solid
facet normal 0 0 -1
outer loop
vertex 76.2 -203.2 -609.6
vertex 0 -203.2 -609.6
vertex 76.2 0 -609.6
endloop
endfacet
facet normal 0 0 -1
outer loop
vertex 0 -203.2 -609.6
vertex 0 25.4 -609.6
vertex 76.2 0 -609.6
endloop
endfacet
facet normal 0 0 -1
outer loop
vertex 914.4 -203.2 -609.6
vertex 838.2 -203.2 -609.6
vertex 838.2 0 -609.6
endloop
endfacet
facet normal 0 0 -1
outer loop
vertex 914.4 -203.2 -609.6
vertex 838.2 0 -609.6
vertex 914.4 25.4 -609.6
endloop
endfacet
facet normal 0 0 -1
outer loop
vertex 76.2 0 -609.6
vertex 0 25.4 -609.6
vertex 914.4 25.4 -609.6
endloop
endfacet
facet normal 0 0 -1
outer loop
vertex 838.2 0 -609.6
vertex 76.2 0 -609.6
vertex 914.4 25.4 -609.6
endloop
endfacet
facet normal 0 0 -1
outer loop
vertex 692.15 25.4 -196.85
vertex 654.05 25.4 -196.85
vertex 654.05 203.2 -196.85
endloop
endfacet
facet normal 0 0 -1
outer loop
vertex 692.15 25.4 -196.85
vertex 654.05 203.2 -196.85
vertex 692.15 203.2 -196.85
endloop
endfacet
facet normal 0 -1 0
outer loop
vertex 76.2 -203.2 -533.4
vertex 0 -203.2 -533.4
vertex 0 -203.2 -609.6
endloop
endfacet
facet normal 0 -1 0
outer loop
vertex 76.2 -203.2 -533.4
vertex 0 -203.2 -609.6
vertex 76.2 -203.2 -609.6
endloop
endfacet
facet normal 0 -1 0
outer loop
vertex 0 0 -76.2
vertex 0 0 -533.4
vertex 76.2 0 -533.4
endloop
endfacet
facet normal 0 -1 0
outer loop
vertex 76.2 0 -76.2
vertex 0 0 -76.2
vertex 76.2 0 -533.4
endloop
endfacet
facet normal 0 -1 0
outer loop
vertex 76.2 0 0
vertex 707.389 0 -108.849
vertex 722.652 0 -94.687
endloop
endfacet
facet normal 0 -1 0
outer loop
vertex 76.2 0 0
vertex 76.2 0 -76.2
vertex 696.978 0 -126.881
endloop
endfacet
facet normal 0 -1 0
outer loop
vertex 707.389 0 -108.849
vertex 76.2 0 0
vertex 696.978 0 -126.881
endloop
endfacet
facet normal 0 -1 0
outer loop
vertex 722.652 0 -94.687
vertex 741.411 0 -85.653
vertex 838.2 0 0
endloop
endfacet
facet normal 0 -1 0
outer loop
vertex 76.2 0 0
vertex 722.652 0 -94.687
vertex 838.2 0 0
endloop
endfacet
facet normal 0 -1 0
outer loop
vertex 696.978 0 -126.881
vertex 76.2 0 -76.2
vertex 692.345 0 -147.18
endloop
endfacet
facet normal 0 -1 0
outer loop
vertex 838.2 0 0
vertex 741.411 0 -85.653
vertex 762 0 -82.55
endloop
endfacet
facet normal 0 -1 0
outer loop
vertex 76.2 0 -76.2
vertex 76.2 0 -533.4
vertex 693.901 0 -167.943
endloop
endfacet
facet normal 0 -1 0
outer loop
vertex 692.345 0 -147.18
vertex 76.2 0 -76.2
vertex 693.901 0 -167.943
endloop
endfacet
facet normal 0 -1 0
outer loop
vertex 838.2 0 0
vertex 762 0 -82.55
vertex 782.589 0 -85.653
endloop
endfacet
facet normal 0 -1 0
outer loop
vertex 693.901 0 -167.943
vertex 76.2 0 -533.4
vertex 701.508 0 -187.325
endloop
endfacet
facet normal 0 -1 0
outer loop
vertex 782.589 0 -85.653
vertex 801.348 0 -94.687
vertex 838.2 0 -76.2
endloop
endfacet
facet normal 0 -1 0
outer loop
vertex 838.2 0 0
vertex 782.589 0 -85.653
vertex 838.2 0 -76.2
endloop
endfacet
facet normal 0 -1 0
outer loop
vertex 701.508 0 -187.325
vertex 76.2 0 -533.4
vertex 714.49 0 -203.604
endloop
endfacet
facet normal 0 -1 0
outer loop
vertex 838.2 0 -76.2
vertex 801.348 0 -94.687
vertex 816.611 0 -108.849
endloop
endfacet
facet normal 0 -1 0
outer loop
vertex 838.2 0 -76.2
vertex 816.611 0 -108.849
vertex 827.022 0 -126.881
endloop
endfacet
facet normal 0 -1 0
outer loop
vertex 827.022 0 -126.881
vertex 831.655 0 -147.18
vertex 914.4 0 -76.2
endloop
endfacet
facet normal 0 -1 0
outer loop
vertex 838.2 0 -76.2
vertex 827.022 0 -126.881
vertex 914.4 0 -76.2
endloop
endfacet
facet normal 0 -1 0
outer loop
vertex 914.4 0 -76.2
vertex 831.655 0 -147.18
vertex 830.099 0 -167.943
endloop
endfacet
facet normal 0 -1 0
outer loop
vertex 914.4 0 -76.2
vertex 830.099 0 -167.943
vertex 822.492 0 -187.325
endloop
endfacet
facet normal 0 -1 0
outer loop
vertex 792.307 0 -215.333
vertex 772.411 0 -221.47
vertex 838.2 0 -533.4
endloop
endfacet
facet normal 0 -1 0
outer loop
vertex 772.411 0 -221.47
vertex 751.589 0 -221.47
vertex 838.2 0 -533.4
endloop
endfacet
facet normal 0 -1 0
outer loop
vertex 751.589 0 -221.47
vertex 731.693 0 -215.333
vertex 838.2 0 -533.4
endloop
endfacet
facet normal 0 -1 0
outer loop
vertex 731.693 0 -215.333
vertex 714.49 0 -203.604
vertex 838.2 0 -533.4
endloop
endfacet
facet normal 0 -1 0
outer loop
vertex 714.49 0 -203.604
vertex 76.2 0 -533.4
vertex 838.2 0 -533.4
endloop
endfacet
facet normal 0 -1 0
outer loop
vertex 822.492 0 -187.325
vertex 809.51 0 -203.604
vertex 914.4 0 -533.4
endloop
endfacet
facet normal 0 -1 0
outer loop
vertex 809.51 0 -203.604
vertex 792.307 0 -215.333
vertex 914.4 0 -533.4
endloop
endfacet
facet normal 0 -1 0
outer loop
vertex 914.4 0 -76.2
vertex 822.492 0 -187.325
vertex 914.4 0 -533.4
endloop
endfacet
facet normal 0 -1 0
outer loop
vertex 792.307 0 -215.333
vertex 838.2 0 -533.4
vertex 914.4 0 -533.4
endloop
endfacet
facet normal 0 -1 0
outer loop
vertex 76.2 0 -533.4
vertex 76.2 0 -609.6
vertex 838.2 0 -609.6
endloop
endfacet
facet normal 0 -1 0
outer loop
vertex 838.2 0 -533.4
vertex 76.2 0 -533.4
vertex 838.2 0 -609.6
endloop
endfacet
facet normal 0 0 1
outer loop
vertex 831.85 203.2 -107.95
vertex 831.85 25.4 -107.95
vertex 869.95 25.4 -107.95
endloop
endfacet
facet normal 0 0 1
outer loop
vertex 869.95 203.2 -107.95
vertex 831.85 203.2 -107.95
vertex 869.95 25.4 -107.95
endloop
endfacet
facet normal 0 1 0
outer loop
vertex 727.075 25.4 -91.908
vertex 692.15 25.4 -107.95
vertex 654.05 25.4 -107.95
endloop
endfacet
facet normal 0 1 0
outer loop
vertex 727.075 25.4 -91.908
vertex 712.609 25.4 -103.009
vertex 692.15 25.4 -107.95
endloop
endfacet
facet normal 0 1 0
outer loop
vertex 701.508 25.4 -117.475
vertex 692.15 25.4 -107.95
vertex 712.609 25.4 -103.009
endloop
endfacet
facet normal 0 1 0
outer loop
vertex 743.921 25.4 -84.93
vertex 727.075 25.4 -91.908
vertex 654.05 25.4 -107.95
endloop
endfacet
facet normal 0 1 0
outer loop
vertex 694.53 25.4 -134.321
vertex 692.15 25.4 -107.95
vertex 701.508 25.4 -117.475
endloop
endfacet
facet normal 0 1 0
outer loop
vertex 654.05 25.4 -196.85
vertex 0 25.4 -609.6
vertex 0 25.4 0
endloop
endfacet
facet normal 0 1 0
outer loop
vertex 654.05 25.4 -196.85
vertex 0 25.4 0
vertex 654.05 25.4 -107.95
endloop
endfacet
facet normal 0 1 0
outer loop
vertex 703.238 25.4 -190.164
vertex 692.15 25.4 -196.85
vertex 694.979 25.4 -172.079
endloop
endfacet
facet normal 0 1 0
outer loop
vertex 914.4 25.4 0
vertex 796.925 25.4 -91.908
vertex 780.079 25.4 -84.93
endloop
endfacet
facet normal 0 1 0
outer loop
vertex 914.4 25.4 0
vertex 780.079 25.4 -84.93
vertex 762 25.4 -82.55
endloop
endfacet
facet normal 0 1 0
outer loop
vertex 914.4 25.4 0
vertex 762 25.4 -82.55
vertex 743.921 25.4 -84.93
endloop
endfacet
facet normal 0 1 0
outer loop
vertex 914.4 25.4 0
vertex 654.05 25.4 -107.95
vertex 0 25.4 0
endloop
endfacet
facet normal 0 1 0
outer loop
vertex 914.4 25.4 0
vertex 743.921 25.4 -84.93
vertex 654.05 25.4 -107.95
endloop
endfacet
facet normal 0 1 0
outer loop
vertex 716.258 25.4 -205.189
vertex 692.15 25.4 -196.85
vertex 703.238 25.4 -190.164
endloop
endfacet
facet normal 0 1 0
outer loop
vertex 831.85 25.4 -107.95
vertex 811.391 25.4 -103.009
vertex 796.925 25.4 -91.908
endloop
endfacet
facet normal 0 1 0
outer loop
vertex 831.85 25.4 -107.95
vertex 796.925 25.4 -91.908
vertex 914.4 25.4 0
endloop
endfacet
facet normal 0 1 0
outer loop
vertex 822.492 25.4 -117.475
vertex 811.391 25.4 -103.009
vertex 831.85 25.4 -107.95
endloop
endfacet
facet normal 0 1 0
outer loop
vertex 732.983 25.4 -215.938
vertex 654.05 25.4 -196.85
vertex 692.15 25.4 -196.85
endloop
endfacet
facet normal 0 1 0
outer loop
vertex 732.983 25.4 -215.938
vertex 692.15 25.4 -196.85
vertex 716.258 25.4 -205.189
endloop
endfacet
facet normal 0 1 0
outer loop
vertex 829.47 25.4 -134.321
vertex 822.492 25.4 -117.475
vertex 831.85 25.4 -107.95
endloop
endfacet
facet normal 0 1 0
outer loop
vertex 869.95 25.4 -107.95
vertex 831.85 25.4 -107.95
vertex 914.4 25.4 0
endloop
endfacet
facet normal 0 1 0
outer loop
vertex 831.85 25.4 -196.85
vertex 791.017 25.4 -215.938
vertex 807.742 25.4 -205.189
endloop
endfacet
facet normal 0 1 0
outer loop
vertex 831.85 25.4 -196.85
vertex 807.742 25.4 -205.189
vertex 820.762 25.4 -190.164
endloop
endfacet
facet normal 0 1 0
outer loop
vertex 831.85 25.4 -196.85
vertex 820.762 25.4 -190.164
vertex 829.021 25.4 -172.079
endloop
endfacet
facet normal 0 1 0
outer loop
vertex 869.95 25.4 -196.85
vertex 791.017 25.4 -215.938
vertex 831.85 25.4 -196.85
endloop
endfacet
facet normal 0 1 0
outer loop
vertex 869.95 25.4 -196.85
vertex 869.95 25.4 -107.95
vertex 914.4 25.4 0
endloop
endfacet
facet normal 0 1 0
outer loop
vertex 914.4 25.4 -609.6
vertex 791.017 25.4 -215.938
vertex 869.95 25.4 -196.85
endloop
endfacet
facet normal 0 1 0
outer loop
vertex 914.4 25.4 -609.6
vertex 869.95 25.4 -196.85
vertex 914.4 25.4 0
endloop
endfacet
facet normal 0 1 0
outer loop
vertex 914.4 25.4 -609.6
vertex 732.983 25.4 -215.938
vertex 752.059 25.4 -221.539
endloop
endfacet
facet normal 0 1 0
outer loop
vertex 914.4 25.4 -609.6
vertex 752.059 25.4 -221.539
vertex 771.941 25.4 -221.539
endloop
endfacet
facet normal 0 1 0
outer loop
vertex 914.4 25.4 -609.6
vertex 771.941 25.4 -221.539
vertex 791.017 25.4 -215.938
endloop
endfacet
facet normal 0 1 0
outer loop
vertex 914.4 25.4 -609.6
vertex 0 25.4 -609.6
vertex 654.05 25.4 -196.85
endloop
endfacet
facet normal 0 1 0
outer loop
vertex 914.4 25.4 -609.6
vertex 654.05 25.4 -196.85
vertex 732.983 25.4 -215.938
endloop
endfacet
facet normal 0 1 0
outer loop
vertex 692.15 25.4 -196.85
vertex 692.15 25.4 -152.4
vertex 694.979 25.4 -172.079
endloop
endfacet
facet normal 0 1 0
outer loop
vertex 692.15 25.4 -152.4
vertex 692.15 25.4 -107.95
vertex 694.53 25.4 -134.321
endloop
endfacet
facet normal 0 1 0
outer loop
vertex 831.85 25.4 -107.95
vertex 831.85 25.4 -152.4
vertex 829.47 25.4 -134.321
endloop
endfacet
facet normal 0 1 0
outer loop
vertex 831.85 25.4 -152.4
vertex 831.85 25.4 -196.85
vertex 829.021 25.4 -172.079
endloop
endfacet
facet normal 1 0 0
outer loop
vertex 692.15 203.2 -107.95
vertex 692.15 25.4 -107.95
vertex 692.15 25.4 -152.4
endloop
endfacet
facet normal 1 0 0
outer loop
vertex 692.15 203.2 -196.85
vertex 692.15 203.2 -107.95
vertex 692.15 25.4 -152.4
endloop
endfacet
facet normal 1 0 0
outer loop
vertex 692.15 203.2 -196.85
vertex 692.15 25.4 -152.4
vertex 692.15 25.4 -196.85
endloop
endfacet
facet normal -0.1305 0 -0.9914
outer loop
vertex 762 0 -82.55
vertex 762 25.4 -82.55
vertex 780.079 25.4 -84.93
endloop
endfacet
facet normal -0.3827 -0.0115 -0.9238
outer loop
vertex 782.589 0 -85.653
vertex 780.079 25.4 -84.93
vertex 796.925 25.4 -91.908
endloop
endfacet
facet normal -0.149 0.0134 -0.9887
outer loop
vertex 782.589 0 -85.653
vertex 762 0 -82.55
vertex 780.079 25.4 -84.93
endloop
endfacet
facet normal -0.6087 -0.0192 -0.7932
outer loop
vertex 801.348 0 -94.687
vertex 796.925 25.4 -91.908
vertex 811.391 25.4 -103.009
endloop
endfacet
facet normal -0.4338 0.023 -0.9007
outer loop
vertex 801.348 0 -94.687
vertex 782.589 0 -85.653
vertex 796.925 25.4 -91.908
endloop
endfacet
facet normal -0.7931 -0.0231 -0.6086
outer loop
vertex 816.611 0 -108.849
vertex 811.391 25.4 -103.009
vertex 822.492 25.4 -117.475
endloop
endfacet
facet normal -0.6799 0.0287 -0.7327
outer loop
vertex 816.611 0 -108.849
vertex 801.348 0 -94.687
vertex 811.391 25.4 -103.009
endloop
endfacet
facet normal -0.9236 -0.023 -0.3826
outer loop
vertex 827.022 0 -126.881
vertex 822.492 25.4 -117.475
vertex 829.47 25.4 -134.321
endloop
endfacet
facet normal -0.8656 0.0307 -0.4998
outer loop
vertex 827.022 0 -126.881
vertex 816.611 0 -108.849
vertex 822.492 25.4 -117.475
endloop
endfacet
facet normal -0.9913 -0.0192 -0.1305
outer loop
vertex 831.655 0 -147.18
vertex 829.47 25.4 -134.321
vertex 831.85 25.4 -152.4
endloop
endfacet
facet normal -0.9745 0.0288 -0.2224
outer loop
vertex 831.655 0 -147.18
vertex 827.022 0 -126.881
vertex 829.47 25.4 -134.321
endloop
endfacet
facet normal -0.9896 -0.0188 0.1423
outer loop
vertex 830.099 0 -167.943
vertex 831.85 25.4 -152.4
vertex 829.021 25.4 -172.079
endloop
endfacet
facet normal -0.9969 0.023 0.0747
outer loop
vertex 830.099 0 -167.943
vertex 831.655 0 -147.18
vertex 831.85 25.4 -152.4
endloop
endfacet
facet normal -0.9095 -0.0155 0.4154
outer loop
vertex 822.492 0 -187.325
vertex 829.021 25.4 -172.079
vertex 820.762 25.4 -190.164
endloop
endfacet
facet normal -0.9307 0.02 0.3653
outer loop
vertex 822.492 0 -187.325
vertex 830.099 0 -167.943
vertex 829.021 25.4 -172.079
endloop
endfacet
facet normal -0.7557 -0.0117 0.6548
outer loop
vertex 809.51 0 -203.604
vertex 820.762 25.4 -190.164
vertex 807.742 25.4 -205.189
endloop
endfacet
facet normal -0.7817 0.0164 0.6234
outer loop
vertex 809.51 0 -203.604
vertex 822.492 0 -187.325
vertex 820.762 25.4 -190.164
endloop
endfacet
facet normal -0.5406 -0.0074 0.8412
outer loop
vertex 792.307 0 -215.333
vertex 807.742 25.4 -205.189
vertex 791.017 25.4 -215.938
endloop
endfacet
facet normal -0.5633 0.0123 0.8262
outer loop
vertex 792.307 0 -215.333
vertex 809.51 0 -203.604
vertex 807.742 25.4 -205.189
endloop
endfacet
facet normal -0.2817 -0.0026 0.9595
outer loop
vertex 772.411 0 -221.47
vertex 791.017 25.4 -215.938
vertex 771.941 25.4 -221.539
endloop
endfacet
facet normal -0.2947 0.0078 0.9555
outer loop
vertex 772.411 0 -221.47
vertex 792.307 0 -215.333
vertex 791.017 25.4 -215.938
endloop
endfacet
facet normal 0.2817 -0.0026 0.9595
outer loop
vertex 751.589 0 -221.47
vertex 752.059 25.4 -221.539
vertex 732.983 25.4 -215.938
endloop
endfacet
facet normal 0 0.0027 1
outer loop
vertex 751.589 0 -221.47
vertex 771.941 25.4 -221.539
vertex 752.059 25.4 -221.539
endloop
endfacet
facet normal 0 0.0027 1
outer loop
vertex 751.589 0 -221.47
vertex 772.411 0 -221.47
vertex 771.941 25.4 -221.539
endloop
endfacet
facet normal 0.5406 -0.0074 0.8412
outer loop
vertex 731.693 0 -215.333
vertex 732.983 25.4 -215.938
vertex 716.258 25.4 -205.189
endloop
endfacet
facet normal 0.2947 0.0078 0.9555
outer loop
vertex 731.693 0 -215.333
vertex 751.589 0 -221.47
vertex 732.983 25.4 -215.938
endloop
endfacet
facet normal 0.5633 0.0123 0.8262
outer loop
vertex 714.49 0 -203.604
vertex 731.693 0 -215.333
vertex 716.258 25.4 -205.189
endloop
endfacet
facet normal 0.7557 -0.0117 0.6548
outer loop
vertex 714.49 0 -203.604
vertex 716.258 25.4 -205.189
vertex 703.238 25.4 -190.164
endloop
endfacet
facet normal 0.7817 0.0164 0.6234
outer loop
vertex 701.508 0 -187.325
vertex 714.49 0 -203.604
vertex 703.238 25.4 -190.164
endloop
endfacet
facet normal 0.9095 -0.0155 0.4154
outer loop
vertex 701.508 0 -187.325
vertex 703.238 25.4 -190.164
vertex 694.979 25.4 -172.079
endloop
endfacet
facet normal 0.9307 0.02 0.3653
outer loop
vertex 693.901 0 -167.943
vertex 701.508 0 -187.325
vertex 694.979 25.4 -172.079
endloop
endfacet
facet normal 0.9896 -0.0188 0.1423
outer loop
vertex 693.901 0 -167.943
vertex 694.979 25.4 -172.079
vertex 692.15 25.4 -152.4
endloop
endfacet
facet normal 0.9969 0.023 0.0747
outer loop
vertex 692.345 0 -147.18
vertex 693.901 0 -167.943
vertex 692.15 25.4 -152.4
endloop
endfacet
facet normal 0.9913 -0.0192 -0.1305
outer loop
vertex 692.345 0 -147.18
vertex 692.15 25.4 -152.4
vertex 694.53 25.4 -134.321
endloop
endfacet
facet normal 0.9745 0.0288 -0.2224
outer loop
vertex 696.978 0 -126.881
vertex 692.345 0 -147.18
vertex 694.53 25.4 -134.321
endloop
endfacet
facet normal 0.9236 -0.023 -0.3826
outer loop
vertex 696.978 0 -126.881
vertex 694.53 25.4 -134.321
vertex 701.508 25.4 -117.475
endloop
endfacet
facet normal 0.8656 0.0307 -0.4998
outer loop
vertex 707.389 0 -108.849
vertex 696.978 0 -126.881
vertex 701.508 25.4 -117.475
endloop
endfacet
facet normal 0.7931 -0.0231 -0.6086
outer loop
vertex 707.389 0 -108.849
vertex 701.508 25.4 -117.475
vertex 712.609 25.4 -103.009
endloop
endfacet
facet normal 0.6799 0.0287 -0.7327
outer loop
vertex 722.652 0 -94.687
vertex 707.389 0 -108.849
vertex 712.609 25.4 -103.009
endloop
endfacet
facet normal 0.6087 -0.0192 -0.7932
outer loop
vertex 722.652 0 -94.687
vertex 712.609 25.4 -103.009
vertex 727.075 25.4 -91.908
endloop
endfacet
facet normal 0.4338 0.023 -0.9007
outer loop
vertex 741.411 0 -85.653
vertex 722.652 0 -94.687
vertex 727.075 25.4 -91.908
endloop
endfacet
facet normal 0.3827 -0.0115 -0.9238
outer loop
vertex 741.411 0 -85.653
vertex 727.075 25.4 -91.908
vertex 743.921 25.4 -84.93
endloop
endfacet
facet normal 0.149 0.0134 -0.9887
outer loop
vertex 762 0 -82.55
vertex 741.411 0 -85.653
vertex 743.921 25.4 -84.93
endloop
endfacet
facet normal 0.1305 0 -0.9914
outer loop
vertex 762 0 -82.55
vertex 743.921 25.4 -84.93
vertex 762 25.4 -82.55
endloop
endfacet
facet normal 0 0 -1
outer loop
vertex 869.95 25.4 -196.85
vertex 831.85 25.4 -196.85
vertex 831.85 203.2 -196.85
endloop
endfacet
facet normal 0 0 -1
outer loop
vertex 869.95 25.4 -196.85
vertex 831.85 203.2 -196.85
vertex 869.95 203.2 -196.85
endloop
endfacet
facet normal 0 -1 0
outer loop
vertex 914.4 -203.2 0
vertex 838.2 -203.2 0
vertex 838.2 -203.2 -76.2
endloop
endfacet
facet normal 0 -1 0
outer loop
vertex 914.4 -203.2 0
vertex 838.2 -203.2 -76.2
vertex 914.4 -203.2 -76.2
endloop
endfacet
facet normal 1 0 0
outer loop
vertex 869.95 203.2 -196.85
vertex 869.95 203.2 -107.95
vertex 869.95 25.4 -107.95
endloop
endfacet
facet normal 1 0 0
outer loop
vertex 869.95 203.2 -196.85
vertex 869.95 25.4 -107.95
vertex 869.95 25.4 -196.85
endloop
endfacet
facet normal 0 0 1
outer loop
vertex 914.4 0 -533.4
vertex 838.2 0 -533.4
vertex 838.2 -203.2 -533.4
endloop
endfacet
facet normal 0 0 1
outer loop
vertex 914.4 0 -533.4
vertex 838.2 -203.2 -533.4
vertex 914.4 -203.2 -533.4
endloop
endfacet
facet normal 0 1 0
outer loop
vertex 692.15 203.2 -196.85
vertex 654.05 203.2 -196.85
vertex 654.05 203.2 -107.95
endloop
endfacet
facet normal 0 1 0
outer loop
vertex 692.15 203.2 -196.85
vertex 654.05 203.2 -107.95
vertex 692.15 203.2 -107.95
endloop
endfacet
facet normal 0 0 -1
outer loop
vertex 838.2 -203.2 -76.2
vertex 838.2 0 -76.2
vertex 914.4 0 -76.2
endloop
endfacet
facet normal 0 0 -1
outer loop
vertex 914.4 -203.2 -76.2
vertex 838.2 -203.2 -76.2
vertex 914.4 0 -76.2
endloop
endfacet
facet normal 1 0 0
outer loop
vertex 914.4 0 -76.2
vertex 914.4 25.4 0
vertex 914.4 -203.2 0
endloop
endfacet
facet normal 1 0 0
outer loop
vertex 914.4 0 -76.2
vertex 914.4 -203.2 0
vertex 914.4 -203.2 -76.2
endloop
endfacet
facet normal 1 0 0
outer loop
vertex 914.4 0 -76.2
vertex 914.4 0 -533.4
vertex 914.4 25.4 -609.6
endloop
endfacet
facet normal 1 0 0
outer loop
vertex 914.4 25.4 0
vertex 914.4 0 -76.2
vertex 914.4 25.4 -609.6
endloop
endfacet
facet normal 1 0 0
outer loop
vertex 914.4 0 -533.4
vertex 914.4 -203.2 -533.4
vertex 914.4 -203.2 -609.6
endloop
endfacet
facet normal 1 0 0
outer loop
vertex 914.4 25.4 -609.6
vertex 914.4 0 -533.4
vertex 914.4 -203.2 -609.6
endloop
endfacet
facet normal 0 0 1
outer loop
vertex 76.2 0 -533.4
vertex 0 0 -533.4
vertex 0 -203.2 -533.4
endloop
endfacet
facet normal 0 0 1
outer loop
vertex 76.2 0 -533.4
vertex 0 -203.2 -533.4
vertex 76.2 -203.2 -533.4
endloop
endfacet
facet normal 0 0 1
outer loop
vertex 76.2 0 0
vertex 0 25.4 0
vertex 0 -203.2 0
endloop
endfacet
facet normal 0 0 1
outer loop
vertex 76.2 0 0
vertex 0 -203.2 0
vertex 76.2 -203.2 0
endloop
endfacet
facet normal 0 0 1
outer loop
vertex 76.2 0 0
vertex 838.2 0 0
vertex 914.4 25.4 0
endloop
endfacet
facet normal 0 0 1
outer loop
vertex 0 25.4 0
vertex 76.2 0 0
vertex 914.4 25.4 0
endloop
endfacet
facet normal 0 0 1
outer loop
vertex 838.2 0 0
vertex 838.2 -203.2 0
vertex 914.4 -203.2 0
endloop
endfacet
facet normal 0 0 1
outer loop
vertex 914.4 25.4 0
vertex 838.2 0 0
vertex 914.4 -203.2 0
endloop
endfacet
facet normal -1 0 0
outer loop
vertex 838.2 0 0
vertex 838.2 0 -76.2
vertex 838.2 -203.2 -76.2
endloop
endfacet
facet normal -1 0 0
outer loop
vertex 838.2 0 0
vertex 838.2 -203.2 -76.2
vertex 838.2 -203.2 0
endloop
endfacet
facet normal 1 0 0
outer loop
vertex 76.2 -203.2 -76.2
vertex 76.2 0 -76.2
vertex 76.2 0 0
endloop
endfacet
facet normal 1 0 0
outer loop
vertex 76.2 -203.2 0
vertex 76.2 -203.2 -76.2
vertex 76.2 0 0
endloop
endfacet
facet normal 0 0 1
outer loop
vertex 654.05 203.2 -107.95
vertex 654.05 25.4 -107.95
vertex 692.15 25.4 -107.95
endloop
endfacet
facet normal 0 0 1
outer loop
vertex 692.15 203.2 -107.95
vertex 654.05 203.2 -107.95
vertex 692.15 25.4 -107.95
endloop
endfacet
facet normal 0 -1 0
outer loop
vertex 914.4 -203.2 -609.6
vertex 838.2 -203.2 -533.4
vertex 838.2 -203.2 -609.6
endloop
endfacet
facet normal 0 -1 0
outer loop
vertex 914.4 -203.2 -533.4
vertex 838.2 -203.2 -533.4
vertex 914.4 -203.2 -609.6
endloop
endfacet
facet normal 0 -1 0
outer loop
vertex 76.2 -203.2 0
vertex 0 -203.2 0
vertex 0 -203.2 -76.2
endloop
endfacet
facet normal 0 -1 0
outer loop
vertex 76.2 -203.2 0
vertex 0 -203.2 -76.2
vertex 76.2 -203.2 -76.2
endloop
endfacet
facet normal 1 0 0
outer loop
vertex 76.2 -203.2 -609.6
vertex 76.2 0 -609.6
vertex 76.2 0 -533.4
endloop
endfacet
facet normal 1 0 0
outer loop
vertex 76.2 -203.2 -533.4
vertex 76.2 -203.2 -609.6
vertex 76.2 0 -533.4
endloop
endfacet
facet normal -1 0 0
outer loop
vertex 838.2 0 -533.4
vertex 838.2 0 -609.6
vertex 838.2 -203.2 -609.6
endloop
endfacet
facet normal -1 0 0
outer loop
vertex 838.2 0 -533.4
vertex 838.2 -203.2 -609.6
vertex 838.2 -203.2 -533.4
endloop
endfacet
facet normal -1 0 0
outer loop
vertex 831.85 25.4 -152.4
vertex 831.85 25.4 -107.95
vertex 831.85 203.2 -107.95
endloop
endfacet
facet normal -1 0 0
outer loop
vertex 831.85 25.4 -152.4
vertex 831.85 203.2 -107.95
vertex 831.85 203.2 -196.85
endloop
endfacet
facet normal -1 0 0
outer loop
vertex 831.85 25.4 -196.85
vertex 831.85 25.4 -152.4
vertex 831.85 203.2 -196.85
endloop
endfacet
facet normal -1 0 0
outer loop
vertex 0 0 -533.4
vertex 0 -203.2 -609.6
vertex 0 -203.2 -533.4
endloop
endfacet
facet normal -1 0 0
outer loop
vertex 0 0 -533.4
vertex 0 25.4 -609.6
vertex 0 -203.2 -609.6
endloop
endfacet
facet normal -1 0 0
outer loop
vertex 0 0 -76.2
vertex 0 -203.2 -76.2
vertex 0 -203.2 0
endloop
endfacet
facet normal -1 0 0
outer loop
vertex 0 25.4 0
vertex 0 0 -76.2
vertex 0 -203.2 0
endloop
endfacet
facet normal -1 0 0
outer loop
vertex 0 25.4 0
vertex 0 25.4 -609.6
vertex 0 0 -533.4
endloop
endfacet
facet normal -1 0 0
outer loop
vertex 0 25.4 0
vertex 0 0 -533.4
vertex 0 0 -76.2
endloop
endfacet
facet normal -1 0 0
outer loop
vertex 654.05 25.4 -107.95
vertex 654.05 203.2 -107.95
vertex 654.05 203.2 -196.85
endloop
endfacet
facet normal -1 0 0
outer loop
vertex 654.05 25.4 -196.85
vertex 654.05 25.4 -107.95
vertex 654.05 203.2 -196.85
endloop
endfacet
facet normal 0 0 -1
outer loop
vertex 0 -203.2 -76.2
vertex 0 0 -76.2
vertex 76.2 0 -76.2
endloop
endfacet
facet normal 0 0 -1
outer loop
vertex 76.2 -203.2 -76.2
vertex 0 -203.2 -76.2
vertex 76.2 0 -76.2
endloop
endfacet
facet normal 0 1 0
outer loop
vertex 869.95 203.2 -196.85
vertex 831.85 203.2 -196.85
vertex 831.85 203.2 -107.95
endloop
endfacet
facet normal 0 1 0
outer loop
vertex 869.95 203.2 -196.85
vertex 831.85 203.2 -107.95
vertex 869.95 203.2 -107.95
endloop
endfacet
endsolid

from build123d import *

# Parameters (mm, degrees)
SKETCH1_W           = 914.4
SKETCH1_H           = 609.6
BOSS_EXTRUDE2_DEPTH = 25.4
SKETCH1_3_R         = 69.85
CUT_EXTRUDE2_DEPTH  = 1100.265518426
SKETCH1_4_W         = 38.1
SKETCH1_4_H         = 88.9
BOSS_EXTRUDE3_DEPTH = 203.2
SKETCH3_W           = 76.2
SKETCH3_H           = 76.2
BOSS_EXTRUDE4_DEPTH = 203.2


with BuildPart() as part:
    # Sketch1 → Boss-Extrude2 (new body)
    with BuildSketch(Plane(origin=(0, 0, 0), x_dir=(1, 0, 0), z_dir=(0, 1, 0))):
        with Locations((457.2, 304.8)):
            Rectangle(SKETCH1_W, SKETCH1_H)
    extrude(amount=BOSS_EXTRUDE2_DEPTH)

    # Sketch1<3> → Cut-Extrude2 (cut, through all)
    with BuildSketch(Plane(origin=(0, 0, 0), x_dir=(1, 0, 0), z_dir=(0, 1, 0))):
        with Locations((762, 152.4)):
            Circle(SKETCH1_3_R)
    extrude(amount=CUT_EXTRUDE2_DEPTH, mode=Mode.SUBTRACT)

    # Sketch1<4> → Boss-Extrude3 (add)
    with BuildSketch(Plane(origin=(0, 0, 0), x_dir=(1, 0, 0), z_dir=(0, 1, 0))):
        with Locations((673.1, 152.4)):
            Rectangle(SKETCH1_4_W, SKETCH1_4_H)
        with Locations((850.9, 152.4)):
            Rectangle(SKETCH1_4_W, SKETCH1_4_H)
    extrude(amount=BOSS_EXTRUDE3_DEPTH)

    # Sketch3 → Boss-Extrude4 (add)
    with BuildSketch(Plane.XZ):
        with Locations((38.1, -571.5)):
            Rectangle(SKETCH3_W, SKETCH3_H)
        with Locations((38.1, -38.1)):
            Rectangle(SKETCH3_W, SKETCH3_H)
        with Locations((876.3, -571.5)):
            Rectangle(SKETCH3_W, SKETCH3_H)
        with Locations((876.3, -38.1)):
            Rectangle(SKETCH3_W, SKETCH3_H)
    extrude(amount=BOSS_EXTRUDE4_DEPTH)


solid = part.part
